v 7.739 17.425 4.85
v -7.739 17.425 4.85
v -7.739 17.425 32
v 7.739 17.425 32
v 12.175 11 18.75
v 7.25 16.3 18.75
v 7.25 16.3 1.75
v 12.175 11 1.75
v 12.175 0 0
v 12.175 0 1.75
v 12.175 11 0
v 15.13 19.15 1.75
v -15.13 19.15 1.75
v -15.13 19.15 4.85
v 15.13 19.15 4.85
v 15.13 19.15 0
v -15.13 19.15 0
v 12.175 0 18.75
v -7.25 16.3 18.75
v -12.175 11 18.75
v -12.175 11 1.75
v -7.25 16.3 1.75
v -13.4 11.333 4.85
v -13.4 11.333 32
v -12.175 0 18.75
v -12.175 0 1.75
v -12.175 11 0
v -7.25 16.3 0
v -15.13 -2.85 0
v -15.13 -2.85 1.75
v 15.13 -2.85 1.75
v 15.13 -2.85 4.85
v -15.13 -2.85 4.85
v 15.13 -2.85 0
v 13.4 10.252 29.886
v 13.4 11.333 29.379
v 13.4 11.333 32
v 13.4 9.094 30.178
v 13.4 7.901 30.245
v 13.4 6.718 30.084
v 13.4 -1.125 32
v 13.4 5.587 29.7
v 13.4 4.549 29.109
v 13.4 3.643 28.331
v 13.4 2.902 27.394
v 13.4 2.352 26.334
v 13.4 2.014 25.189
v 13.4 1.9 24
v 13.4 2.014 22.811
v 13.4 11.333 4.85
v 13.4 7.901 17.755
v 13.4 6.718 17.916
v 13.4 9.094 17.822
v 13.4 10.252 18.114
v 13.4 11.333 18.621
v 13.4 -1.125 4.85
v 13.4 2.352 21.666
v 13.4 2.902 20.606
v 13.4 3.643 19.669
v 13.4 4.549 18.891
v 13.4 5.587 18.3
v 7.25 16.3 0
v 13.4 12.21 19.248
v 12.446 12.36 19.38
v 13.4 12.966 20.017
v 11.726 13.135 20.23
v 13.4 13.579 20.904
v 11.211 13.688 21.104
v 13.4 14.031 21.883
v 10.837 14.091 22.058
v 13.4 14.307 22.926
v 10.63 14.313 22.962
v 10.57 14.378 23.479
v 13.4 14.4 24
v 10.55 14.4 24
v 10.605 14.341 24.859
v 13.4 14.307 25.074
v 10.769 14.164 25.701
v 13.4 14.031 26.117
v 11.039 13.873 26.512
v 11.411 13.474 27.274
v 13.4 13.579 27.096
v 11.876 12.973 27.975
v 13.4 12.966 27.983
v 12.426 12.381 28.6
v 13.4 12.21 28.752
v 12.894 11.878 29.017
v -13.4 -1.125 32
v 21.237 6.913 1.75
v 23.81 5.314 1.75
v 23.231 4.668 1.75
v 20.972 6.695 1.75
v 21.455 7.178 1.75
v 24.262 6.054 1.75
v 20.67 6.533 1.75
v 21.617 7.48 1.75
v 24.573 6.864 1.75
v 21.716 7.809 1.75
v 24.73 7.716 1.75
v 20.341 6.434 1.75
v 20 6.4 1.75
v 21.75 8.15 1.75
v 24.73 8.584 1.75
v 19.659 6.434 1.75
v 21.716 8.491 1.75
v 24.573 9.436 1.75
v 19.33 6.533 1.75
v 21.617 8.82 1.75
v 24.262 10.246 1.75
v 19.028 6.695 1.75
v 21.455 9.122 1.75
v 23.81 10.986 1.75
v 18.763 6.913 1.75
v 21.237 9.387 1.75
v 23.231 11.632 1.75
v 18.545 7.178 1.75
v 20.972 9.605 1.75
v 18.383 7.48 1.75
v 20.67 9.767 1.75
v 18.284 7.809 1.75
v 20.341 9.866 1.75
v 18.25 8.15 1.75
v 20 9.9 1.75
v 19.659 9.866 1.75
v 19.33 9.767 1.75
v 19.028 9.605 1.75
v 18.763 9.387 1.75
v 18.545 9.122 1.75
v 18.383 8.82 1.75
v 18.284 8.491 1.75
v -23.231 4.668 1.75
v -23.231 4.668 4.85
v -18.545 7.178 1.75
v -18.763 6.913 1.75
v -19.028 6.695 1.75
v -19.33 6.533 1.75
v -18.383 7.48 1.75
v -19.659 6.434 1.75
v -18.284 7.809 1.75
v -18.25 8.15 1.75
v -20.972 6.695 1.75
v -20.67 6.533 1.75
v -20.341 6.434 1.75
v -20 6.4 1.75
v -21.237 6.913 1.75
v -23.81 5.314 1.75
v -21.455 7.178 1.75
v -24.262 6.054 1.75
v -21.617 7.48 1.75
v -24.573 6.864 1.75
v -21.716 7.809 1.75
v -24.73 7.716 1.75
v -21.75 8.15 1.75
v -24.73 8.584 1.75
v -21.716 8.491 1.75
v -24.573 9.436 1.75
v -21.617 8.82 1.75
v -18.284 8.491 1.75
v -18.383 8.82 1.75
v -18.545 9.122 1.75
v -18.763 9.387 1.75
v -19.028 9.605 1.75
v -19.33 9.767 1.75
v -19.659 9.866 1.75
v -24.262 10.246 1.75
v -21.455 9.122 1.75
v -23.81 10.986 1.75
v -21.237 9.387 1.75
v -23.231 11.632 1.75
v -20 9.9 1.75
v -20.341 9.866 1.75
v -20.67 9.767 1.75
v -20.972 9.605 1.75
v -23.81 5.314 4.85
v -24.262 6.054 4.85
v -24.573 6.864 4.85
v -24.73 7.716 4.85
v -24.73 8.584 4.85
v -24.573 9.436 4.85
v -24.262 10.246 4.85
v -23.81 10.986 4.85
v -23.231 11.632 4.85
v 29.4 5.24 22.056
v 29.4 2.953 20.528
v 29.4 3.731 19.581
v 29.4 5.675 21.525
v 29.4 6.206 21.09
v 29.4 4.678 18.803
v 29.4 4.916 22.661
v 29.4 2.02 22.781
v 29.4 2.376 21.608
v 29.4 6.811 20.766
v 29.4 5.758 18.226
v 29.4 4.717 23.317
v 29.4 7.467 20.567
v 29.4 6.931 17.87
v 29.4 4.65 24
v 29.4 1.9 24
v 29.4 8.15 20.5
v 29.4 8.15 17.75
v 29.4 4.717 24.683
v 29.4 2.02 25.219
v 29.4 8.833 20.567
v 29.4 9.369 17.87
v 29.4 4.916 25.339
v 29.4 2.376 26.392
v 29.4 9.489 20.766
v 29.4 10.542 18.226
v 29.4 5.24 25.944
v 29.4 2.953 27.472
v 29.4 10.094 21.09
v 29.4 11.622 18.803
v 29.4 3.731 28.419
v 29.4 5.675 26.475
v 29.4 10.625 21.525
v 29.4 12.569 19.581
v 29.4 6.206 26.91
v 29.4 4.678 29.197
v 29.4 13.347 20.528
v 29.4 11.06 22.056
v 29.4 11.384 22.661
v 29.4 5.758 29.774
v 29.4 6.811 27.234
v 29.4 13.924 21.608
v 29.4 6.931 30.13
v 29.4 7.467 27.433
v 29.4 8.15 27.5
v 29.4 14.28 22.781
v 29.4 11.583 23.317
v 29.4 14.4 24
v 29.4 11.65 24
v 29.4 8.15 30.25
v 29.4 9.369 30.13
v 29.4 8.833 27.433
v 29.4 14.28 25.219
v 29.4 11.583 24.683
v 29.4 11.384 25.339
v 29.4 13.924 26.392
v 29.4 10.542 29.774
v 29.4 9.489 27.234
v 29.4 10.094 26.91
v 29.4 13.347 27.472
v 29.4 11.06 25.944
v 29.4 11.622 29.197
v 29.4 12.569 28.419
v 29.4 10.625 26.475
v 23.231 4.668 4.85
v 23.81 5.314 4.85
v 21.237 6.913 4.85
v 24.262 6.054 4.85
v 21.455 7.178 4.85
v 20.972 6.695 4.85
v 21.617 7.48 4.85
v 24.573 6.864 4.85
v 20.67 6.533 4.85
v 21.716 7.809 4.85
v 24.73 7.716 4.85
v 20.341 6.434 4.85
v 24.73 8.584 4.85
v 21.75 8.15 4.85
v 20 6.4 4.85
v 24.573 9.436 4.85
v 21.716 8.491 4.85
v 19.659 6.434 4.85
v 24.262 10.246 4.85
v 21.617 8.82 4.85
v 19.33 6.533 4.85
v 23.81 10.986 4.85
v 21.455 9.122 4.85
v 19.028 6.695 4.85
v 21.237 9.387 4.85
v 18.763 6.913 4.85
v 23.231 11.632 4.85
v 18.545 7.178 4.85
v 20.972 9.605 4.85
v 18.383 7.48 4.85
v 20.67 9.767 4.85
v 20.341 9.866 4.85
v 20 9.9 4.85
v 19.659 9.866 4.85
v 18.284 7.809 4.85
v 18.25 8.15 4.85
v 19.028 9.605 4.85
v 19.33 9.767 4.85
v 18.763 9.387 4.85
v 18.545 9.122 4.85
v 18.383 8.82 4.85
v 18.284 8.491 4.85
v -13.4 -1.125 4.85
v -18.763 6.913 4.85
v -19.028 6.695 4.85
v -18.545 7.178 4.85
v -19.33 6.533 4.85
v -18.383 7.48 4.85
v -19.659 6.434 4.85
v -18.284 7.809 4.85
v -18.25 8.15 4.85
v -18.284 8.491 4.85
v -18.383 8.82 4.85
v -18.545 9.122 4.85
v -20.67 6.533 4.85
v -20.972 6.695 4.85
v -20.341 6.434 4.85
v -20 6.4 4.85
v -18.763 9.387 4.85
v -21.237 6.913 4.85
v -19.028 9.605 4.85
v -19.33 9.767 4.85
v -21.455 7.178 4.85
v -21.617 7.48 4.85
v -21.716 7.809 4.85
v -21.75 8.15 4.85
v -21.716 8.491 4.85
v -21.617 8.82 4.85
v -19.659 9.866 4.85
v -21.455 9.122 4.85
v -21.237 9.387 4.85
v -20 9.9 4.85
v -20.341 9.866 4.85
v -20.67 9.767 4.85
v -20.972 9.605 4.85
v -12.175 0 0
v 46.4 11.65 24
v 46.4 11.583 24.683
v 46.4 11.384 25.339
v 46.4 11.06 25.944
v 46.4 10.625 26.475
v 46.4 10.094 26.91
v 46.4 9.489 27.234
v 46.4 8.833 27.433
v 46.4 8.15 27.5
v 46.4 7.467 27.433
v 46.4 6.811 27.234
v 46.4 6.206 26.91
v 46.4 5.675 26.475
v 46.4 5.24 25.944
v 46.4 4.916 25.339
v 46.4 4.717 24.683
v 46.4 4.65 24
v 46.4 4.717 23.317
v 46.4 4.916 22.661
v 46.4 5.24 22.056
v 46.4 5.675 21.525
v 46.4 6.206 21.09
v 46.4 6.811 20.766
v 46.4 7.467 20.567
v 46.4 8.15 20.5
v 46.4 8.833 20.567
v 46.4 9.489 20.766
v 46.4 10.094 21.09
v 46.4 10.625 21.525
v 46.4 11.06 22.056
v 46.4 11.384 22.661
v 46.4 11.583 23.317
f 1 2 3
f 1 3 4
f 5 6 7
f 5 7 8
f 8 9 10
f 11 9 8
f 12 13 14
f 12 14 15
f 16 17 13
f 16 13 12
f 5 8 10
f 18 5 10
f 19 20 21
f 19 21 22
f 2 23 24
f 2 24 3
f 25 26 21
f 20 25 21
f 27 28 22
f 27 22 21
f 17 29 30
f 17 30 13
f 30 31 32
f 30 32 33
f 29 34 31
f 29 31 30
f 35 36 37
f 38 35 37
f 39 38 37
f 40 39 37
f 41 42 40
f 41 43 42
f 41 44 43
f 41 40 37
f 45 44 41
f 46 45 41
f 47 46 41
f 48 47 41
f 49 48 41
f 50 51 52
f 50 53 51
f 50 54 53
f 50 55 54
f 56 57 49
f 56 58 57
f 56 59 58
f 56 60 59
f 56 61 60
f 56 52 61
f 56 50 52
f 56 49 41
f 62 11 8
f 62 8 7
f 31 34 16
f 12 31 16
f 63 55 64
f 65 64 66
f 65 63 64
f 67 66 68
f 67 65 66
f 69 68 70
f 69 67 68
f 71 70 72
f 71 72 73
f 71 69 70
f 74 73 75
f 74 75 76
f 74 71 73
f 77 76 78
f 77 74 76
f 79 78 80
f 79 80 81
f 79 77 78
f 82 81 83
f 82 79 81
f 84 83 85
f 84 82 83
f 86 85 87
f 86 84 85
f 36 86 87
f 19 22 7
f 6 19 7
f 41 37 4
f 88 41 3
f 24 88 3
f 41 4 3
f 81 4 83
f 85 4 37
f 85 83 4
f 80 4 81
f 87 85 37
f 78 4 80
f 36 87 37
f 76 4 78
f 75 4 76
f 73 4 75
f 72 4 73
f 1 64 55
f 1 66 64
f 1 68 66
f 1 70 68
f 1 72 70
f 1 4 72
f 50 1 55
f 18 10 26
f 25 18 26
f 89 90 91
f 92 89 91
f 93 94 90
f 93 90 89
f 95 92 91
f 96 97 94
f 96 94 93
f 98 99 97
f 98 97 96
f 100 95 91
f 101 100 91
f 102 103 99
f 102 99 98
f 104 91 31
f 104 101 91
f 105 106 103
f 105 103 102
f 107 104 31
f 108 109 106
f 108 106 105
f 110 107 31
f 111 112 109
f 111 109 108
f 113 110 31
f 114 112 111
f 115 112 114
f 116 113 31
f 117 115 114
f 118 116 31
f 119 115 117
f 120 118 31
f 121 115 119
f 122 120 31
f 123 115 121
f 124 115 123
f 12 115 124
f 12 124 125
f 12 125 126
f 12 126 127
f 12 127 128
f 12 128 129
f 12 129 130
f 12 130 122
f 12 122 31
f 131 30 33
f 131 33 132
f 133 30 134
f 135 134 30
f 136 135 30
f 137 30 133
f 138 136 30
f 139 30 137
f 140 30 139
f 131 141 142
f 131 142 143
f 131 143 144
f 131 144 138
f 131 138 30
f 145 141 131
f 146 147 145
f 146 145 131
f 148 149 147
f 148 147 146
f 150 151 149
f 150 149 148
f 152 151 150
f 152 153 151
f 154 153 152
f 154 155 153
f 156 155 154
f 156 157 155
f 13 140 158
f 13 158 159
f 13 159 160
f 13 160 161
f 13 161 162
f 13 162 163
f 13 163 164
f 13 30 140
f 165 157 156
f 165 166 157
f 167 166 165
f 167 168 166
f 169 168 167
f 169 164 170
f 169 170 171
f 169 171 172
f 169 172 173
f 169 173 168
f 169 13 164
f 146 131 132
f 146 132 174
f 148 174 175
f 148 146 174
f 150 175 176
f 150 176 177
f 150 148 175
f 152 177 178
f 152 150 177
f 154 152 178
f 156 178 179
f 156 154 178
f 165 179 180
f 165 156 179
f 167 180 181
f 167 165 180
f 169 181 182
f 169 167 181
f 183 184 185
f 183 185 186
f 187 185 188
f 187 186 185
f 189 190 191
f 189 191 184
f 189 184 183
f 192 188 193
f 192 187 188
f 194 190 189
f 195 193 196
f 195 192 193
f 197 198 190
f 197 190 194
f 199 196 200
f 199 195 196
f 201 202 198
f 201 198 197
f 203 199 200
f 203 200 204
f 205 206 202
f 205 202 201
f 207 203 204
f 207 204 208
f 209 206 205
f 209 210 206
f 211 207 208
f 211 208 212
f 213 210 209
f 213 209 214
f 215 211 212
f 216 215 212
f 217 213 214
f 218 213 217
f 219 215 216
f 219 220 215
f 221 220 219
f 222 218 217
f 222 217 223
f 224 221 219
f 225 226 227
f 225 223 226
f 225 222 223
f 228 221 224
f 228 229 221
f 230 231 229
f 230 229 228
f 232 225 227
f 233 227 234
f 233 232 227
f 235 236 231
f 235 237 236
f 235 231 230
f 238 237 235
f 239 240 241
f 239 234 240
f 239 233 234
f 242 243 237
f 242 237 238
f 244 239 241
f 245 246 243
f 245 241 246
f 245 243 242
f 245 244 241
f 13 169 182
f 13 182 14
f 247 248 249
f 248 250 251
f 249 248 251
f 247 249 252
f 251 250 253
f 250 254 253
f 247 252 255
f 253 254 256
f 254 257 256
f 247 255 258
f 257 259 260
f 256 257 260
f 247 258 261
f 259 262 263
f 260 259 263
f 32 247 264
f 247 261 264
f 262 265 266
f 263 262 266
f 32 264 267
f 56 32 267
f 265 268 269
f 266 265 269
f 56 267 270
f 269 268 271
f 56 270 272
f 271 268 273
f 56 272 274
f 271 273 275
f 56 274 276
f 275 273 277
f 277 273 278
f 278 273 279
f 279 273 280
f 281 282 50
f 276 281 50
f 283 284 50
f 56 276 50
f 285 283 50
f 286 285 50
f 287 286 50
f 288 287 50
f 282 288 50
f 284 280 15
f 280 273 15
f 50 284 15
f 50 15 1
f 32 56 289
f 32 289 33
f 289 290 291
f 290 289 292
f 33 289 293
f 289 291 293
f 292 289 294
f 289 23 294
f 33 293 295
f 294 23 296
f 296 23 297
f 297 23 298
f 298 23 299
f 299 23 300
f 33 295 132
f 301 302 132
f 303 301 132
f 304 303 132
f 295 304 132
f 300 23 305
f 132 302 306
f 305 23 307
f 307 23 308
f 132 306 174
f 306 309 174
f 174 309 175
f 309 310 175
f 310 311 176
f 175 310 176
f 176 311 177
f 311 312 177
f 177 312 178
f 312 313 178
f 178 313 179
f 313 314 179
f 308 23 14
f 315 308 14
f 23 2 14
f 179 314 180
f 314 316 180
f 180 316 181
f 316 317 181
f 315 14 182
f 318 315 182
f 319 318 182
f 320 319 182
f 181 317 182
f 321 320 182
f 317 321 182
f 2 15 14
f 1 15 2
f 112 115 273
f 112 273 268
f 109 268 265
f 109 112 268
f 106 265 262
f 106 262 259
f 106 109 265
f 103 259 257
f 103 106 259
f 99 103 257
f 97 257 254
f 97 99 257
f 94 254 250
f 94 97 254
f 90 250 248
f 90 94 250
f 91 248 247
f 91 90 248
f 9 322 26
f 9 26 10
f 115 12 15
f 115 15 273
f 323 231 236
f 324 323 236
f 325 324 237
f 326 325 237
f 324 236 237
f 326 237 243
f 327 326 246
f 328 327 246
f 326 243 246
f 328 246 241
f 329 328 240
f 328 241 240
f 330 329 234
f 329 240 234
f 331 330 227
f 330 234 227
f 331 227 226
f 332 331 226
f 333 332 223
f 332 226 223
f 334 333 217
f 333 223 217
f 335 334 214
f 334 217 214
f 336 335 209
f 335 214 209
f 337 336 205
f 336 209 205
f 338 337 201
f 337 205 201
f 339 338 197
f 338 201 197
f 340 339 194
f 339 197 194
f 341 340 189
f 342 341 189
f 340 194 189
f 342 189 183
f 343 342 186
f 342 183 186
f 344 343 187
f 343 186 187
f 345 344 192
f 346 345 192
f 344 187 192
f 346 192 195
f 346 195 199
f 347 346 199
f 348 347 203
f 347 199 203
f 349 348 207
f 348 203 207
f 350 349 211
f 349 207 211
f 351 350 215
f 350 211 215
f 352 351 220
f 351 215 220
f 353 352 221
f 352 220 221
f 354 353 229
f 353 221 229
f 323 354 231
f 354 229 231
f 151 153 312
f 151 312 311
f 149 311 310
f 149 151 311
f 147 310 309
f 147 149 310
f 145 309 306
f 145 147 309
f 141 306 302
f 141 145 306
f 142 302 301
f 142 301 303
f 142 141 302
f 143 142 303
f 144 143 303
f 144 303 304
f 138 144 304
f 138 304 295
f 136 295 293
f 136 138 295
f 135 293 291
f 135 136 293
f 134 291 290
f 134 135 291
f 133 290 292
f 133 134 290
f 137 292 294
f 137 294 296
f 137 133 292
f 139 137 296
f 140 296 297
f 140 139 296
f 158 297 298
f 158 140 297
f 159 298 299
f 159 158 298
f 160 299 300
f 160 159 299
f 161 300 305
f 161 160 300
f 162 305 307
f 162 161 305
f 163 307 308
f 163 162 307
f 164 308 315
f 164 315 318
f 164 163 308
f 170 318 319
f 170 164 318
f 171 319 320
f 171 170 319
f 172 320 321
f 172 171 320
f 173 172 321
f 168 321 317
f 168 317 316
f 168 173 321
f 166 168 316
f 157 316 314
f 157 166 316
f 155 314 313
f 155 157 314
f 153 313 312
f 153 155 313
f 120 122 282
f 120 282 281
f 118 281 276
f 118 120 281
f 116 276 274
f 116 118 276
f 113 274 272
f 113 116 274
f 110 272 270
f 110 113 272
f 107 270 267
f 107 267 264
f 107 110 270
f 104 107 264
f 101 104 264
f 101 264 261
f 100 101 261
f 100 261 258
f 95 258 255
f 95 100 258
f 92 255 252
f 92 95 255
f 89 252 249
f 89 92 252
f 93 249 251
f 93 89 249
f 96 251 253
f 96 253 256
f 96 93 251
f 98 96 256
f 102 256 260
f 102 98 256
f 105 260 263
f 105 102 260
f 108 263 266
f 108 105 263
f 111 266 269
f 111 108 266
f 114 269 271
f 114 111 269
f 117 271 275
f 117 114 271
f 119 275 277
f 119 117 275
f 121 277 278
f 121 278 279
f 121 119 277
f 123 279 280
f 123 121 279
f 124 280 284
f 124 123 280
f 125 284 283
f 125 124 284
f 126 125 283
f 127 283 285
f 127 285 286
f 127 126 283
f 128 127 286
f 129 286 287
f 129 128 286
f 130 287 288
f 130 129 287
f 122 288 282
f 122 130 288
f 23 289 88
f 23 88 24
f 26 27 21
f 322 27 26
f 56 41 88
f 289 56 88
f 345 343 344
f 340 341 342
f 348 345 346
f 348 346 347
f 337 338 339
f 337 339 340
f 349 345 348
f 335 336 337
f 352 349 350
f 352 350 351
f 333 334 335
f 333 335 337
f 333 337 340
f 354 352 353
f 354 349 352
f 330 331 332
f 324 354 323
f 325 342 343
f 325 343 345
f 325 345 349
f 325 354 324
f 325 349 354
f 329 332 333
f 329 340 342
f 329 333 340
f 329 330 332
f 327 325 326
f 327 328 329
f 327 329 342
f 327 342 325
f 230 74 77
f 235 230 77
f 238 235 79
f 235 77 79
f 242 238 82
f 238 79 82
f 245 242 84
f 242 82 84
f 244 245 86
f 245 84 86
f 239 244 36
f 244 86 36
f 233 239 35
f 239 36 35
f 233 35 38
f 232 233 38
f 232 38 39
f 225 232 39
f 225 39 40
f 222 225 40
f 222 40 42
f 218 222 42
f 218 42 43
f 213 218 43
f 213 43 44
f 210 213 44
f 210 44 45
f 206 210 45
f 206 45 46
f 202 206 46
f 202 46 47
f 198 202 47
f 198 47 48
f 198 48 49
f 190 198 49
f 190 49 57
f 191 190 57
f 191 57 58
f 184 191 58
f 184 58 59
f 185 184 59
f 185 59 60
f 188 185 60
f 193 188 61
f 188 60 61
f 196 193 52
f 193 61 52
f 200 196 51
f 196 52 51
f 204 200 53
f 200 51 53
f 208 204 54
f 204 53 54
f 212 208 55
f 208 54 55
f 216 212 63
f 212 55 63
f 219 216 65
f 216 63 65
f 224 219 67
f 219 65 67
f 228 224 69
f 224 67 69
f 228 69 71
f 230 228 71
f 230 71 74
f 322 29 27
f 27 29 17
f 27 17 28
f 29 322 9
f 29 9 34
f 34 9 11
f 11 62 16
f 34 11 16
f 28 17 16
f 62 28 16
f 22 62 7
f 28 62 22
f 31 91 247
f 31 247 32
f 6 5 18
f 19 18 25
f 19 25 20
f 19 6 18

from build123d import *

# Parameters (mm, degrees)
SKETCH_1_W                  = 30.26
SKETCH_1_H                  = 22
EXTRUDE_1_DEPTH             = 1.75
SKETCH_2_R                  = 1.75
EXTRUDE_2_DEPTH             = 3.1
EXTRUDE_3_DEPTH             = 27.15
SKETCH_4_R                  = 6.25
EXTRUDE_4_DEPTH             = 16
EXTRUDE_4_DIRECTION_2_REACH = 55.349
SKETCH_5_R                  = 3.5
EXTRUDE_5_DEPTH             = 17
CUT_EXTRUDE_1_DEPTH         = 17


with BuildPart() as part:
    # 草图1 → 凸台-拉伸1 (new body)
    with BuildSketch(Plane.XY):
        with Locations((0, 8.15)):
            Rectangle(SKETCH_1_W, SKETCH_1_H)
        Polygon((7.25, 16.3), (-7.25, 16.3), (-12.175, 11), (-12.175, 0), (12.175, 0), (12.175, 11), align=None, mode=Mode.SUBTRACT)
    extrude(amount=EXTRUDE_1_DEPTH)

    # 草图2 → 凸台-拉伸2 (add)
    with BuildSketch(Plane.XY.offset(1.75)):
        with BuildLine():
            Line((-15.13, 19.15), (15.13, 19.15))
            Line((15.13, 19.15), (23.231176295, 11.631666232))
            ThreePointArc((23.231176295, 11.631666232), (24.75, 8.15), (23.231176295, 4.668333768))
            Line((23.231176295, 4.668333768), (15.13, -2.85))
            Line((15.13, -2.85), (-15.13, -2.85))
            Line((-15.13, -2.85), (-23.231176295, 4.668333768))
            ThreePointArc((-23.231176295, 4.668333768), (-24.75, 8.15), (-23.231176295, 11.631666232))
            Line((-23.231176295, 11.631666232), (-15.13, 19.15))
        make_face()
        with Locations(Location((-20, 8.15, 0), (0, 0, 180))):
            Circle(SKETCH_2_R, mode=Mode.SUBTRACT)
        with Locations(Location((20, 8.15, 0), (0, 0, 180))):
            Circle(SKETCH_2_R, mode=Mode.SUBTRACT)
    extrude(amount=EXTRUDE_2_DEPTH)

    # 草图3 → 凸台-拉伸3 (add)
    with BuildSketch(Plane.XY.offset(4.85)):
        Polygon((13.4, -1.125), (-13.4, -1.125), (-13.4, 11.33280506), (-7.738856589, 17.425), (7.738856589, 17.425), (13.4, 11.33280506), align=None)
    extrude(amount=EXTRUDE_3_DEPTH)

    # 草图4 → 凸台-拉伸4 (add)
    with BuildSketch(Plane(origin=(13.4, 0, 0), x_dir=(0, 0, -1), z_dir=(1, 0, 0))):
        with Locations(Location((-24, 8.15, 0), (0, 0, 90))):
            Circle(SKETCH_4_R)
    extrude(amount=EXTRUDE_4_DEPTH)

    # 草图4 → 凸台-拉伸4 direction 2 (add, up to next)
    with BuildSketch(Plane(origin=(13.4, 0, 0), x_dir=(0, 0, -1), z_dir=(1, 0, 0)), mode=Mode.PRIVATE) as extrude_4_direction_2_sk1:
        with Locations(Location((-24, 8.15, 0), (0, 0, 90))):
            Circle(SKETCH_4_R)
    extrude_4_direction_2_tool1 = extrude(extrude_4_direction_2_sk1.sketch, amount=-EXTRUDE_4_DIRECTION_2_REACH, mode=Mode.PRIVATE) - part.part
    add(extrude_4_direction_2_tool1.solids().sort_by_distance((13.4, 8.15, 24))[0])

    # 草图5 → 凸台-拉伸5 (add)
    with BuildSketch(Plane(origin=(29.4, 0, 0), x_dir=(0, 0, -1), z_dir=(1, 0, 0))):
        with Locations(Location((-24, 8.15, 0), (0, 0, 90))):
            Circle(SKETCH_5_R)
    extrude(amount=EXTRUDE_5_DEPTH)

    # 草图6 → 切除-拉伸1 (cut)
    with BuildSketch(Plane(origin=(0, 0, 1.75), x_dir=(-1, 0, 0), z_dir=(0, 0, -1))):
        Polygon((-12.175, 11), (-12.175, 0), (12.175, 0), (12.175, 11), (7.25, 16.3), (-7.25, 16.3), align=None)
    extrude(amount=-CUT_EXTRUDE_1_DEPTH, mode=Mode.SUBTRACT)


solid = part.part
